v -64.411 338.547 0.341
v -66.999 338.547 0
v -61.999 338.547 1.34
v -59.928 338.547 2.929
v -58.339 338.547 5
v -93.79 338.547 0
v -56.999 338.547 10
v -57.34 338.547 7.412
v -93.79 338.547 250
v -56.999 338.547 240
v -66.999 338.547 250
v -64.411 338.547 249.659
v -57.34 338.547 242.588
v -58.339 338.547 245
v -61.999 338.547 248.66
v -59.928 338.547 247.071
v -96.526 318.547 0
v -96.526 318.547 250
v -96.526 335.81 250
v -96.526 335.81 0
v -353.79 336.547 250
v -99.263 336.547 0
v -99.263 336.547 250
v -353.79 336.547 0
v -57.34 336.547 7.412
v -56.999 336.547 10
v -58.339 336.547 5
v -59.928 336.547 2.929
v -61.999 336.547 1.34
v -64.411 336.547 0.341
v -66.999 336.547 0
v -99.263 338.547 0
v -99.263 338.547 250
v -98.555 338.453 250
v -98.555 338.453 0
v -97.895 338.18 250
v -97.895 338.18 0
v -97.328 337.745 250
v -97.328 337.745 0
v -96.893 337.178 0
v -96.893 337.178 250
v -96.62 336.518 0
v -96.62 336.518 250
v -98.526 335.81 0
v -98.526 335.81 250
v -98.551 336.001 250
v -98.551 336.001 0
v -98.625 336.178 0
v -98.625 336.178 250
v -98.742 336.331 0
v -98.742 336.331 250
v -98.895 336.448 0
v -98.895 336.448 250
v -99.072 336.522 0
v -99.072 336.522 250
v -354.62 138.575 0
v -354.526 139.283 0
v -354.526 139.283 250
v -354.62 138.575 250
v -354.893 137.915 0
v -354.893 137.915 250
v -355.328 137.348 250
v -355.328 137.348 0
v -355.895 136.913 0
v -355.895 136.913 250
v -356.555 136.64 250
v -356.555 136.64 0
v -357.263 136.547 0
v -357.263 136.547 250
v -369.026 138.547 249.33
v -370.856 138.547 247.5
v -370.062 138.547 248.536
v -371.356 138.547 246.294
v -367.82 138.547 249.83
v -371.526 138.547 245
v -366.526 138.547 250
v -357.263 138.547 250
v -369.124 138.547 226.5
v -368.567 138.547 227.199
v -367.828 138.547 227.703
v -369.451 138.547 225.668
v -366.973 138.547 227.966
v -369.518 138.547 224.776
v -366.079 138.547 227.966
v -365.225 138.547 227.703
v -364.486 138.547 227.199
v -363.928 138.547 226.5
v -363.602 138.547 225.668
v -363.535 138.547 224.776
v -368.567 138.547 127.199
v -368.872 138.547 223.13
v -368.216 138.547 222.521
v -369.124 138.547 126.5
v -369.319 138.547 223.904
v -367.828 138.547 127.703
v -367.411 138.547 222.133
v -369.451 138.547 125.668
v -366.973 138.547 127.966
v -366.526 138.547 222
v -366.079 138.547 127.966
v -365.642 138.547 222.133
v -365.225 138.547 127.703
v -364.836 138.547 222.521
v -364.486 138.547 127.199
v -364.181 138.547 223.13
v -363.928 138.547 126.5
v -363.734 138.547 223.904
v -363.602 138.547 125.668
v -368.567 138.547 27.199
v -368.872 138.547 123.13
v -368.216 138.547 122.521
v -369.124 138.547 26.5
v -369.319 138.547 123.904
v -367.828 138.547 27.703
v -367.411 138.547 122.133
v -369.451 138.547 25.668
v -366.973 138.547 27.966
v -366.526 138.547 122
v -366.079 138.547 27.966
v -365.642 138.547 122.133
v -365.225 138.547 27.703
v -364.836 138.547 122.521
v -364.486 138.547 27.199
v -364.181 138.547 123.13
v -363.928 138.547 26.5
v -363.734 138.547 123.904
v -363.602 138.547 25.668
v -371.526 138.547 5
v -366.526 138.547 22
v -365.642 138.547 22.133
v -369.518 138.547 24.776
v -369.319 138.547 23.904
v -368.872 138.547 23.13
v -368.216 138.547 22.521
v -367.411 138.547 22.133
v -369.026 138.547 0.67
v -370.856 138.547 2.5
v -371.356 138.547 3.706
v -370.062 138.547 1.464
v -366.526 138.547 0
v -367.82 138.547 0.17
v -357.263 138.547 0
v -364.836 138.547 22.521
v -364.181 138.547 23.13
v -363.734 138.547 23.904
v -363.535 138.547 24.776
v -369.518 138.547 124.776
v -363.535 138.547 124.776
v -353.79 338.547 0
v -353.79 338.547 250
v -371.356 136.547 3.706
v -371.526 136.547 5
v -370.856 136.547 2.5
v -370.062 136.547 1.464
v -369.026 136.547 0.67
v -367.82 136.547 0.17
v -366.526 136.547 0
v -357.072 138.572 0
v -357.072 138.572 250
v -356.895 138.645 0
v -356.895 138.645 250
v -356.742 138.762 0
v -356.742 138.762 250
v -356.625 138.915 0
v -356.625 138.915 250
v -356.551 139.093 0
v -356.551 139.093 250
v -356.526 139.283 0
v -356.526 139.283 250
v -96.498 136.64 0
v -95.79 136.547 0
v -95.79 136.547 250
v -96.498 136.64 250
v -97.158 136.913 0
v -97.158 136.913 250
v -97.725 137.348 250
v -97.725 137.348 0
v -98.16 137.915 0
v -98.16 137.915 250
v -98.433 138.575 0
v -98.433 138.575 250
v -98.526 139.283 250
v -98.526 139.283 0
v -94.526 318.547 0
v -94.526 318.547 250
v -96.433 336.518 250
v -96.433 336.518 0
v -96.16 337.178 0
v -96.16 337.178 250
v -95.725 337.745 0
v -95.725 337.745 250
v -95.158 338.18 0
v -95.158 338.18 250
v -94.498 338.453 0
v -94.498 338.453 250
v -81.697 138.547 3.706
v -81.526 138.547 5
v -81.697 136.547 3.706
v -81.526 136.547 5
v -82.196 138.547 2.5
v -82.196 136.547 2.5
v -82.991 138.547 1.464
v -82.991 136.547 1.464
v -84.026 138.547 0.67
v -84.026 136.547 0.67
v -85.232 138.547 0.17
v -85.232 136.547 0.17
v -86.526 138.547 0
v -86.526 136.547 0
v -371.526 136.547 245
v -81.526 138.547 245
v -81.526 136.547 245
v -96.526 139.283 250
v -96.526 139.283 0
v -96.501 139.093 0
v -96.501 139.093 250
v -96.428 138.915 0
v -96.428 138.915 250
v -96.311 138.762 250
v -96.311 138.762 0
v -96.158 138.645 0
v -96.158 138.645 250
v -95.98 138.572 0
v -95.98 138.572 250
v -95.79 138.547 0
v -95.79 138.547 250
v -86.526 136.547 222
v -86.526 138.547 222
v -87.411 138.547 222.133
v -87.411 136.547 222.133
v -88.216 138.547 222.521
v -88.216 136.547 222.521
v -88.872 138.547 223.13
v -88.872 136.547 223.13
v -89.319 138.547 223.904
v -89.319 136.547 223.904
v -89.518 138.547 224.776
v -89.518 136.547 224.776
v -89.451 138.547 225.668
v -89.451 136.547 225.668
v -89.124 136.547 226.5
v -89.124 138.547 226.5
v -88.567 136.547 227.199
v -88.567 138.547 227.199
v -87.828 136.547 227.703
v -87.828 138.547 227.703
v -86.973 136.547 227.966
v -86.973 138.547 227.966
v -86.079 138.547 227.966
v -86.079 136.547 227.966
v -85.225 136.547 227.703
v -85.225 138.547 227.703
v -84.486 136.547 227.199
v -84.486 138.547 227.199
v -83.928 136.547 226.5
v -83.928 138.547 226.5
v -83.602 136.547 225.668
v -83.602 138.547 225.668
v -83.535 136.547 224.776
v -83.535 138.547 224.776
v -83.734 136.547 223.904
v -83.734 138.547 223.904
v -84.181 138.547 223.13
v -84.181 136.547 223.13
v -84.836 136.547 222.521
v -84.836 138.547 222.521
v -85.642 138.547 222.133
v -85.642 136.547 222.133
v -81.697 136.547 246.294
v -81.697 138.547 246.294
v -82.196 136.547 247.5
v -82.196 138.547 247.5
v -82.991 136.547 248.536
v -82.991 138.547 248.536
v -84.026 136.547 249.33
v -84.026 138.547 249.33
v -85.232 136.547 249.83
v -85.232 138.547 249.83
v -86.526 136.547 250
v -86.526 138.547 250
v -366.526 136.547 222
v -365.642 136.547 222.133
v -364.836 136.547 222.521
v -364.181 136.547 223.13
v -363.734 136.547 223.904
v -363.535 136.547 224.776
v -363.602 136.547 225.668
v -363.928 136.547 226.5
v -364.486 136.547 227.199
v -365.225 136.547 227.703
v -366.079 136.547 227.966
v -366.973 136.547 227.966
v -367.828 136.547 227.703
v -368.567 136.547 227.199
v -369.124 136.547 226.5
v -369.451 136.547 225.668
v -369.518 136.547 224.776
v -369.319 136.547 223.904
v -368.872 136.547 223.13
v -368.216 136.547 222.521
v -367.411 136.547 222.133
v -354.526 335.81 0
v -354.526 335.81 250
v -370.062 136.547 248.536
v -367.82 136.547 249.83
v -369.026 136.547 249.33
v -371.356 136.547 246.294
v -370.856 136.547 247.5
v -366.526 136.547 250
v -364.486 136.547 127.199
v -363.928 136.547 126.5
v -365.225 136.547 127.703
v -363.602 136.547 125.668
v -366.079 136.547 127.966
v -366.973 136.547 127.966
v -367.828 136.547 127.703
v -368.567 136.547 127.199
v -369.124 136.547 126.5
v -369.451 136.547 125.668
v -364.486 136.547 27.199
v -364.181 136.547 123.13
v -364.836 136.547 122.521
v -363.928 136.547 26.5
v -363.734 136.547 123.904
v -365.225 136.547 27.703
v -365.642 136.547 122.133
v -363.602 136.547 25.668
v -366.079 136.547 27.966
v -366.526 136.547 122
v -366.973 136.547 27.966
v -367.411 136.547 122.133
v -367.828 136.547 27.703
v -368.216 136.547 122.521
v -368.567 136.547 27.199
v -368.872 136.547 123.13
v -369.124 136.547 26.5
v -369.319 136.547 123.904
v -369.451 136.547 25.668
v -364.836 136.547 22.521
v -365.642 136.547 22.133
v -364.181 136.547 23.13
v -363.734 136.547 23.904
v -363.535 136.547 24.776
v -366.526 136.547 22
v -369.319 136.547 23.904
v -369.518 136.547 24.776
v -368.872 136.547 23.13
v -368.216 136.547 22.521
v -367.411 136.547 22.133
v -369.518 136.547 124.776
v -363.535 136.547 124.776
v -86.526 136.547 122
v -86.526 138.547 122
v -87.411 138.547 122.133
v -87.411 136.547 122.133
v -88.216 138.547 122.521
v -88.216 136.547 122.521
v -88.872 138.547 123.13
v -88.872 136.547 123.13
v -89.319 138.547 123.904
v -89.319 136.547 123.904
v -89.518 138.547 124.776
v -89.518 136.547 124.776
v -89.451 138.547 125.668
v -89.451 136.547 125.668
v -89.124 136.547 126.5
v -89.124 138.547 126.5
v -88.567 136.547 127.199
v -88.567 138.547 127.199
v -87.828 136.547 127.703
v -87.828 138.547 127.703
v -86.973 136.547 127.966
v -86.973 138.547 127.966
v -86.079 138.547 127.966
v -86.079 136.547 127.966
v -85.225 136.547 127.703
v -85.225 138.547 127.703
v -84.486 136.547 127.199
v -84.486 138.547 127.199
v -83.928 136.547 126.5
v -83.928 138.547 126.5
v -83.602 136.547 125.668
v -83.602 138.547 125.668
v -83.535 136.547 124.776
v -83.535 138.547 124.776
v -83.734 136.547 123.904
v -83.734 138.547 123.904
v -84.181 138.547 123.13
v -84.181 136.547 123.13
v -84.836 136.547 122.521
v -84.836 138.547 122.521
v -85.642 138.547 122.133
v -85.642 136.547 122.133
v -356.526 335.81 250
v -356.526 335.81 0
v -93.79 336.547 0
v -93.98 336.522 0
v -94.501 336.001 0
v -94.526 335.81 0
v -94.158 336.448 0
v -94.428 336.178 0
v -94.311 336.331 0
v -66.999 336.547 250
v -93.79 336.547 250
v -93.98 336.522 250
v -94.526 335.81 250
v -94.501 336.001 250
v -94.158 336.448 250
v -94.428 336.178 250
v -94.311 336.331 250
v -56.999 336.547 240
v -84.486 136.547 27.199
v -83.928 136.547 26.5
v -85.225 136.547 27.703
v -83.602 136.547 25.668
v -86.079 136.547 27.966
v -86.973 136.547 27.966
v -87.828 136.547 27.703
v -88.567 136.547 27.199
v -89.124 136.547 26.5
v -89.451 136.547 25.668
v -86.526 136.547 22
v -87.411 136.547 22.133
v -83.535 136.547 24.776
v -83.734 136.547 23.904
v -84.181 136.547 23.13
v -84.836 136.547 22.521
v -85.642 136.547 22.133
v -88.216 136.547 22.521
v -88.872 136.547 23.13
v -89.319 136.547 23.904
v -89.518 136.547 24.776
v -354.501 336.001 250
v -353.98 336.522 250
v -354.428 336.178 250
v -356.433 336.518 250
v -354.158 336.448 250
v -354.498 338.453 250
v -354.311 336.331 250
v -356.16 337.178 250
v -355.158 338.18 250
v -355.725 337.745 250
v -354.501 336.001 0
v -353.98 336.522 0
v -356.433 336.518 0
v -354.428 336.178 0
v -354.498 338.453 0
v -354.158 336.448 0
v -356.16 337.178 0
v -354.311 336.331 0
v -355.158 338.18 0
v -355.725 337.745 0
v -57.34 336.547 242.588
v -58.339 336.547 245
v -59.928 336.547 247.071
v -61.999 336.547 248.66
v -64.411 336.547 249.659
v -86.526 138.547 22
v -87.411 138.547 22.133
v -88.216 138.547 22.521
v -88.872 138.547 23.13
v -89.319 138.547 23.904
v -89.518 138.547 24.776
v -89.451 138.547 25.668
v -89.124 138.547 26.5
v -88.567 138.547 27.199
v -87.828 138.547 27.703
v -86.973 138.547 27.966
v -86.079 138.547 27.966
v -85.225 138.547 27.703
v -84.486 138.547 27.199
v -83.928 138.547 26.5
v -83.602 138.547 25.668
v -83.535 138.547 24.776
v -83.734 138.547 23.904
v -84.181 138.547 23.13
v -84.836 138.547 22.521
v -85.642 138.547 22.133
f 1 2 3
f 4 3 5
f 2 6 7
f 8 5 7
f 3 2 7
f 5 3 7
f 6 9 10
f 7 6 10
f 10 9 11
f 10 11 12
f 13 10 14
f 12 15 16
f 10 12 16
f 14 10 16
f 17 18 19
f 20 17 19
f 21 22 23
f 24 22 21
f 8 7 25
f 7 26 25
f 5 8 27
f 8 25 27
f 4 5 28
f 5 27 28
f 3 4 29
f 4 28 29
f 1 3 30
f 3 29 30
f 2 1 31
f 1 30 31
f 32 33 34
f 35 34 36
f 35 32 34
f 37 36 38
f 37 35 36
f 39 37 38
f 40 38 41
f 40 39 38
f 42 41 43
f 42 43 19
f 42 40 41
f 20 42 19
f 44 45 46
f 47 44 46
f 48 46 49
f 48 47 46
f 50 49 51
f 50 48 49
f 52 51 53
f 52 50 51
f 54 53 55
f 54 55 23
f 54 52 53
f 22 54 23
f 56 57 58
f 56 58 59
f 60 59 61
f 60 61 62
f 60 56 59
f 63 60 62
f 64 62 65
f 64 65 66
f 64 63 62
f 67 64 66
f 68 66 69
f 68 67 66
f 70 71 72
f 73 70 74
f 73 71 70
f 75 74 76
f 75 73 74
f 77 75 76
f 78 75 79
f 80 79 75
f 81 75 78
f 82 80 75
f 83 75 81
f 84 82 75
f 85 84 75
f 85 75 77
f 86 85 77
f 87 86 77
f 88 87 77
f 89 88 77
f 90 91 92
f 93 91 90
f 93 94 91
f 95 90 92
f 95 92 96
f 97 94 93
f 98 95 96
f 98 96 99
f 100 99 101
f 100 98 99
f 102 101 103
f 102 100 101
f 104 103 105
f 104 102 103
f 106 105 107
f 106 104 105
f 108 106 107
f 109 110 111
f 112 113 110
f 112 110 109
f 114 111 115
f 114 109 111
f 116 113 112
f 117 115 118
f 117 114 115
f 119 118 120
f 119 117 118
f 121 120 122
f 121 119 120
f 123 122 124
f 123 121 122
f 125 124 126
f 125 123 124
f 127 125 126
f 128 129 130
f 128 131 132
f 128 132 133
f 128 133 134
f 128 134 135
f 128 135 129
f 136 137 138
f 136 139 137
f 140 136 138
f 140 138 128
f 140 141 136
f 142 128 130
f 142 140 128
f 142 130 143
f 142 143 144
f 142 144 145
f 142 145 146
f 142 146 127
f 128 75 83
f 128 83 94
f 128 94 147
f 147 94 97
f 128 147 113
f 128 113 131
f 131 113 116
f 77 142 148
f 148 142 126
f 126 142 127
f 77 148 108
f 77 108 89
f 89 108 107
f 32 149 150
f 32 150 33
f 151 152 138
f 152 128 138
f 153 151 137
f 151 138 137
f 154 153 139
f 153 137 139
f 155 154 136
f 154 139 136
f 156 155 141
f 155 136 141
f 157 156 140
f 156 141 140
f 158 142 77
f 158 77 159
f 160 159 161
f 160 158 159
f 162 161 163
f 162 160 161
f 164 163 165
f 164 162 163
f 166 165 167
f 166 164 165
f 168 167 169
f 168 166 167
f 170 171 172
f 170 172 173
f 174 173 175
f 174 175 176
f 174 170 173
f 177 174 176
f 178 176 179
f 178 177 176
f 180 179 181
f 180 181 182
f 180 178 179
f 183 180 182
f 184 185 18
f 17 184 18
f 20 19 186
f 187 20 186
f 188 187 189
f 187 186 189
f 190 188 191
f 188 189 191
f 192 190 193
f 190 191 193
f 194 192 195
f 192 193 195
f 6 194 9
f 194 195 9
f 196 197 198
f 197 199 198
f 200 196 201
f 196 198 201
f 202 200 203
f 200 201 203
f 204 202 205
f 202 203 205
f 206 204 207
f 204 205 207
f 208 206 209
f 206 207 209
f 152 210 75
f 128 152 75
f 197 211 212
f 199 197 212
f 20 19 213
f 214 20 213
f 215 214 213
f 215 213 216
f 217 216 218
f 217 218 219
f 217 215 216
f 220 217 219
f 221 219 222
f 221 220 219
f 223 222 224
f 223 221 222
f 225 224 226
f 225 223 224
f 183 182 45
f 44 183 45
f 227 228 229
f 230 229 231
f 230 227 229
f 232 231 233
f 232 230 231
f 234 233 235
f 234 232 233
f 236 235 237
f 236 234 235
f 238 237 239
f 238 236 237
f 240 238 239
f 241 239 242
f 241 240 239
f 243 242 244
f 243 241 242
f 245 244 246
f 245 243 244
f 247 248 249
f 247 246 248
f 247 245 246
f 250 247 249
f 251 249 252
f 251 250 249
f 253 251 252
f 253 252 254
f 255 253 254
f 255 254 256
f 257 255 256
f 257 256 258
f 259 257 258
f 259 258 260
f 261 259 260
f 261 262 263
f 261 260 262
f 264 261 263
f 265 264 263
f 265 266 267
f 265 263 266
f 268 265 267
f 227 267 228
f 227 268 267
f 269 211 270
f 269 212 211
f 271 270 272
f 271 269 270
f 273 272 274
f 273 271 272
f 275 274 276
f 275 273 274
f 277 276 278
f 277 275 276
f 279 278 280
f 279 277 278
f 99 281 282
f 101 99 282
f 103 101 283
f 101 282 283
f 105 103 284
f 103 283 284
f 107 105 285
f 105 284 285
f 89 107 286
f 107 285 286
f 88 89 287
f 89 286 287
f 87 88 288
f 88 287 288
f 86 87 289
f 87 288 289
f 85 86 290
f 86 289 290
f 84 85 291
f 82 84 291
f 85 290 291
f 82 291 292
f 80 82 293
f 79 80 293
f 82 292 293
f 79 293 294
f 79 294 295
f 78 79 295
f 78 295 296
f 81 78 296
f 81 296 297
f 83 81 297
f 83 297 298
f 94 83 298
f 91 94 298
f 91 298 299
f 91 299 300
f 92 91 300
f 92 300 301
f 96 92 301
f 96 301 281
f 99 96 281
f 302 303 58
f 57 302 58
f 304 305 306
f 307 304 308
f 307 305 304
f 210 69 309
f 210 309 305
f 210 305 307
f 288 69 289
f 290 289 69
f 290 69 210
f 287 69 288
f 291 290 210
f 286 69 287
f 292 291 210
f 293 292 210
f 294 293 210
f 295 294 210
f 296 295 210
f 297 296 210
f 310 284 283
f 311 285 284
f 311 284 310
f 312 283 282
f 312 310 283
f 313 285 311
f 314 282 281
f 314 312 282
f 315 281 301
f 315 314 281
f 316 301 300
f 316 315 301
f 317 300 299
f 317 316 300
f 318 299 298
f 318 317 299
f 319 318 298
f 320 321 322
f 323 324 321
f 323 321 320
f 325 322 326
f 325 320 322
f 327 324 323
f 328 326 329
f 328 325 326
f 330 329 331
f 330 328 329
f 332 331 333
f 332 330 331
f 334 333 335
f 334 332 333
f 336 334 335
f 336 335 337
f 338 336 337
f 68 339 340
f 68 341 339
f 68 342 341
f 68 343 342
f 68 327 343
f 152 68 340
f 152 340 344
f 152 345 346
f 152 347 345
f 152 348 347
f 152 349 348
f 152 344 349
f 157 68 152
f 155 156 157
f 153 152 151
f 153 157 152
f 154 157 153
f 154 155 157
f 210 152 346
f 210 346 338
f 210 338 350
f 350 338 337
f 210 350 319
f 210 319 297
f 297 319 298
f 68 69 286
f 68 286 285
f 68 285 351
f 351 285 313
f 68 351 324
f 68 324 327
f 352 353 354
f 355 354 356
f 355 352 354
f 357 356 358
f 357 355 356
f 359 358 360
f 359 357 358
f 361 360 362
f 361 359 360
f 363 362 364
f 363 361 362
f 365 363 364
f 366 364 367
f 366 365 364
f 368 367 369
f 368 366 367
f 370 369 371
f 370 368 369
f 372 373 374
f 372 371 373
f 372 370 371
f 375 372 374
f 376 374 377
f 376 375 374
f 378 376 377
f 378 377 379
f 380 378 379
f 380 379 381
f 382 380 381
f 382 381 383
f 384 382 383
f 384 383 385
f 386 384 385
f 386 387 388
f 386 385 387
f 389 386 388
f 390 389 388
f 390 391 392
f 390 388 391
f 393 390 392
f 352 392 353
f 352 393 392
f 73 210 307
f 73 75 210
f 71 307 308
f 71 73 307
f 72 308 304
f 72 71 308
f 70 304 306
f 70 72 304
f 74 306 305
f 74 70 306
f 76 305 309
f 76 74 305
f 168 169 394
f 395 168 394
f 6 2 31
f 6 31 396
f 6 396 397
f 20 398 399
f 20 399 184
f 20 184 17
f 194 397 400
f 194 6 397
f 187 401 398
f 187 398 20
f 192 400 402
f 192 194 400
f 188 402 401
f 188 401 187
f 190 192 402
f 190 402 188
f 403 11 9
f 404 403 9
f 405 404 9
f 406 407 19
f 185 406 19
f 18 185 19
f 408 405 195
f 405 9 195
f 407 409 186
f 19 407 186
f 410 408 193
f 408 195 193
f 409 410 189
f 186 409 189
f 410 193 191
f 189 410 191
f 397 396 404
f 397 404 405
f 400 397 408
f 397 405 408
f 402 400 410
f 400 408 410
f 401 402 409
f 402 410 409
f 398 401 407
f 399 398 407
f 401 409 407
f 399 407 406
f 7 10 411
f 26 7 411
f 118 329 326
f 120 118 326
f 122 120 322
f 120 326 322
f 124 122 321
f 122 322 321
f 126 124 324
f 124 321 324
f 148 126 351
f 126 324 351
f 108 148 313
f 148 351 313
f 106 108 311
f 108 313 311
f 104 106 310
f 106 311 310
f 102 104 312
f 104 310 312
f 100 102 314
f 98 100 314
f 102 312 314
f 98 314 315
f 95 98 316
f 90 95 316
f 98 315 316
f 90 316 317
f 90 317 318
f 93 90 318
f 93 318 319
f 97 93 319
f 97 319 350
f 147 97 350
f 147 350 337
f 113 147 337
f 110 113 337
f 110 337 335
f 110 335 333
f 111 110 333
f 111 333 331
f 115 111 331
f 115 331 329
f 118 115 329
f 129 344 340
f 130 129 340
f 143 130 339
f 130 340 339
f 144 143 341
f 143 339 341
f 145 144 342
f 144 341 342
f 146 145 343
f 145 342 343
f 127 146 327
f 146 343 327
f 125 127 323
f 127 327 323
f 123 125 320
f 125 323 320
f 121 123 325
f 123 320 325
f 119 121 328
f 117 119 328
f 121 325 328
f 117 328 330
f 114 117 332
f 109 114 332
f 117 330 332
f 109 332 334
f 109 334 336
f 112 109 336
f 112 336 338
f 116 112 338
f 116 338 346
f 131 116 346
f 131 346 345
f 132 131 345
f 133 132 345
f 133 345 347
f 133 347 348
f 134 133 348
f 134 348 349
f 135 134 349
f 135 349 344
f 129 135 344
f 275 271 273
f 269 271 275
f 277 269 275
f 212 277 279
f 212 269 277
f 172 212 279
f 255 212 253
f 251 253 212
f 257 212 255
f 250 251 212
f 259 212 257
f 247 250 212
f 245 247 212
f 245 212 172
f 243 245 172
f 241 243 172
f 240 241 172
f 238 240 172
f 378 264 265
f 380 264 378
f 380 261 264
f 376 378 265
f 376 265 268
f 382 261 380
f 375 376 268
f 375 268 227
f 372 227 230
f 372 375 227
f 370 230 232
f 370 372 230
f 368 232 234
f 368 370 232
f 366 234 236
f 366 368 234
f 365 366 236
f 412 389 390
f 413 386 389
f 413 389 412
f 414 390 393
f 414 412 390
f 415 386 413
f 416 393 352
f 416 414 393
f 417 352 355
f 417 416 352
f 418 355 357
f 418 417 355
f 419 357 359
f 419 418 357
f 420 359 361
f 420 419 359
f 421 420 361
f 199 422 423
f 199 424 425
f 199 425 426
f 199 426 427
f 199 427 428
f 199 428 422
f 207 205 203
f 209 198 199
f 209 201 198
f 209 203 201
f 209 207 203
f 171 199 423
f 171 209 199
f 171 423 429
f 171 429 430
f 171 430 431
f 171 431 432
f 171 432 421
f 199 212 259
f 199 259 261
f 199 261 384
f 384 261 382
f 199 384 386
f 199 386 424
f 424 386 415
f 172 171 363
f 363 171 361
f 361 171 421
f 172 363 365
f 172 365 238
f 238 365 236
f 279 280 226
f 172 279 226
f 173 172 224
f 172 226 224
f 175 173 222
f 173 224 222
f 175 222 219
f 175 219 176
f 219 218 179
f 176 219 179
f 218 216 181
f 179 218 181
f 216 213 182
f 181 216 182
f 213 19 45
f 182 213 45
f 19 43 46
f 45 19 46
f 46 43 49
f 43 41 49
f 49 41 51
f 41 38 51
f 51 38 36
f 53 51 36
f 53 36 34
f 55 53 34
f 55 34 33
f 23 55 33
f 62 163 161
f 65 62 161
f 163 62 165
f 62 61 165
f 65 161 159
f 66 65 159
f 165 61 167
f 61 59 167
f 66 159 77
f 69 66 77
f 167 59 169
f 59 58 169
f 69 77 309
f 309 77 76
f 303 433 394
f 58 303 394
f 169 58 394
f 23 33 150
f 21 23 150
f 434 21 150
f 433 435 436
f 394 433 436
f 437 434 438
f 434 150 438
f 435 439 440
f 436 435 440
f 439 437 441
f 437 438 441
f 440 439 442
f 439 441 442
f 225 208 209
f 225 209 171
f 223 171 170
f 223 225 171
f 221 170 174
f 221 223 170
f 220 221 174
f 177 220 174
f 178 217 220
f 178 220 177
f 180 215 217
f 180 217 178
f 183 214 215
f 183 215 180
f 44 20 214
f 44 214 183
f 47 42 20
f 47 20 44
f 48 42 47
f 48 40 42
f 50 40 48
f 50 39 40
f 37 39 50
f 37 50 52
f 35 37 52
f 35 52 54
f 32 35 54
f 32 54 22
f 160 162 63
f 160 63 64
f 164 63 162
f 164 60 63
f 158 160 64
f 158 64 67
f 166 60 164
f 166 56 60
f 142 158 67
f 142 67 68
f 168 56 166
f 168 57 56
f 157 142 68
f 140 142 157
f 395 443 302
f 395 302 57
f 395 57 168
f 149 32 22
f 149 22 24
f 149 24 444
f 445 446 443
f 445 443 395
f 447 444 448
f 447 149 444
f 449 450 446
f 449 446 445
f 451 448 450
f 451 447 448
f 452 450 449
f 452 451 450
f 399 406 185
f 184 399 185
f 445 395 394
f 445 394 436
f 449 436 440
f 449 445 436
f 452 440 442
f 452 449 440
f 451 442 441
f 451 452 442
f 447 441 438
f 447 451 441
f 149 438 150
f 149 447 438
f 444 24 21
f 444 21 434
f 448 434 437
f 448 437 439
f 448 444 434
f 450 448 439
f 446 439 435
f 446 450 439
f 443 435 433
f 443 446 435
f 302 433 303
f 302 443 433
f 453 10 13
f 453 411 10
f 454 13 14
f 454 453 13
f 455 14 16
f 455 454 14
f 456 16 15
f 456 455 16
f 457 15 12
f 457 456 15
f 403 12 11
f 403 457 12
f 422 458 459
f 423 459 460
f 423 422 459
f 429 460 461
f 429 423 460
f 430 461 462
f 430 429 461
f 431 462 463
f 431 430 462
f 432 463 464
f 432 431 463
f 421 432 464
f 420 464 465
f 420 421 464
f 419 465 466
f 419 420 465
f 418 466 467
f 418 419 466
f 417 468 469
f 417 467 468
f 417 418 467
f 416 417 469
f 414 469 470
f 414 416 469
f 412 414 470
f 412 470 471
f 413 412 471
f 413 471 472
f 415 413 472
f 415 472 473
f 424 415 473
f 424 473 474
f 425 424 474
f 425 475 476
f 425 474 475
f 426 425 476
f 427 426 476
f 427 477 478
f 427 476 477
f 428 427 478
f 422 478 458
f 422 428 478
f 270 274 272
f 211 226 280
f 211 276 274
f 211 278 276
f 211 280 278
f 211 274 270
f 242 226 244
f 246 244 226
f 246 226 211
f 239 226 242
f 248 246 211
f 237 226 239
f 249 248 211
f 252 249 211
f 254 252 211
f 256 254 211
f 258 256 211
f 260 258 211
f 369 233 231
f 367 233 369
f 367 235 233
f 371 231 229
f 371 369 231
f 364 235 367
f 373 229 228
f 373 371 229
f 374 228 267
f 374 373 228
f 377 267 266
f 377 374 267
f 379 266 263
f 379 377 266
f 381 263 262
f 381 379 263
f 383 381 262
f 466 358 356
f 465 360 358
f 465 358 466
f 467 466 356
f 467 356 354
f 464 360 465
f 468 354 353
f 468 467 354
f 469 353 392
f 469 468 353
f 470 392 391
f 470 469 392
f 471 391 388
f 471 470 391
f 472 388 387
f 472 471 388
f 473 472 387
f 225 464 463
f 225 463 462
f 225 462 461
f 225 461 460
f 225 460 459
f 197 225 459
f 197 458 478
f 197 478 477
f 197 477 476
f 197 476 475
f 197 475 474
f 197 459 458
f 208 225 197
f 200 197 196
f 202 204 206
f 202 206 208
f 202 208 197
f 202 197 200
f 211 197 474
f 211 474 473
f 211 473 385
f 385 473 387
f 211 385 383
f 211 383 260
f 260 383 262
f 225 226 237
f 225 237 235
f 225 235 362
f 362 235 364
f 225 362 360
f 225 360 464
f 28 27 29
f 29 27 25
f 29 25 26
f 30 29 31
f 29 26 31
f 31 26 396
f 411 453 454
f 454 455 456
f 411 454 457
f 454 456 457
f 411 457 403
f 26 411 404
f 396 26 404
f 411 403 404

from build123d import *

# Parameters (mm, degrees)
SM_BASE_FLANGE_1_DEPTH = 250
SM_BASE_FLANGE_2_DEPTH = 250
FILLET_1_R             = 10
FILLET_2_R             = 5
SKETCH_9_R             = 3
CUT_EXTRUDE_1_DEPTH    = 10


# Sheet-metal steps are written as plain solids
with BuildPart() as part:
    # Sketch 1 → 基体-法兰1 (new body)
    with BuildSketch(Plane.XY):
        with BuildLine():
            Line((-371.526300738, 138.546722129), (-357.262900738, 138.546722129))
            ThreePointArc((-357.262900738, 138.546722129), (-356.742045883, 138.762467274), (-356.526300738, 139.283322129))
            Line((-356.526300738, 139.283322129), (-356.526300738, 335.810122129))
            ThreePointArc((-356.526300738, 335.810122129), (-355.724769156, 337.745190547), (-353.789700738, 338.546722129))
            Line((-353.789700738, 338.546722129), (-99.262900738, 338.546722129))
            ThreePointArc((-99.262900738, 338.546722129), (-97.327832321, 337.745190547), (-96.526300738, 335.810122129))
            Line((-96.526300738, 335.810122129), (-96.526300738, 139.283322129))
            ThreePointArc((-96.526300738, 139.283322129), (-96.310555593, 138.762467274), (-95.789700738, 138.546722129))
            Line((-95.789700738, 138.546722129), (-81.526300738, 138.546722129))
            Line((-81.526300738, 138.546722129), (-81.526300738, 136.546722129))
            Line((-81.526300738, 136.546722129), (-95.789700738, 136.546722129))
            ThreePointArc((-95.789700738, 136.546722129), (-97.724769156, 137.348253712), (-98.526300738, 139.283322129))
            Line((-98.526300738, 139.283322129), (-98.526300738, 335.810122129))
            ThreePointArc((-98.526300738, 335.810122129), (-98.742045883, 336.330976984), (-99.262900738, 336.546722129))
            Line((-99.262900738, 336.546722129), (-353.789700738, 336.546722129))
            ThreePointArc((-353.789700738, 336.546722129), (-354.310555593, 336.330976984), (-354.526300738, 335.810122129))
            Line((-354.526300738, 335.810122129), (-354.526300738, 139.283322129))
            ThreePointArc((-354.526300738, 139.283322129), (-355.327832321, 137.348253712), (-357.262900738, 136.546722129))
            Line((-357.262900738, 136.546722129), (-371.526300738, 136.546722129))
            Line((-371.526300738, 136.546722129), (-371.526300738, 138.546722129))
        make_face()
    extrude(amount=SM_BASE_FLANGE_1_DEPTH)

    # 圆角2
    fillet_2_edges = [part.edges().sort_by_distance(p)[0] for p in [
        (-371.526300738, 137.546722129, 0),
        (-81.526300738, 137.546722129, 0),
        (-371.526300738, 137.546722129, 250),
        (-81.526300738, 137.546722129, 250),
    ]]
    fillet(fillet_2_edges, radius=FILLET_2_R)

    # 草图9 → 切除-拉伸1 (cut)
    with BuildSketch(Plane.XZ.offset(-136.546722129)):
        with Locations(Location((-366.526300738, 225, 0), (0, 0, 270))):
            Circle(SKETCH_9_R)
        with Locations(Location((-366.526300738, 125, 0), (0, 0, 270))):
            Circle(SKETCH_9_R)
        with Locations(Location((-366.526300738, 25, 0), (0, 0, 270))):
            Circle(SKETCH_9_R)
    cut_extrude_1 = extrude(amount=-CUT_EXTRUDE_1_DEPTH, mode=Mode.SUBTRACT)

    # 镜向1: 切除-拉伸1 across plane
    add(cut_extrude_1.mirror(Plane(origin=(-226.526300738, 0, 0), x_dir=(0, 0, 1), z_dir=(1, 0, 0))), mode=Mode.SUBTRACT)


with BuildPart() as body_2:
    # 草图6 → 基体-法兰2 (new body)
    with BuildSketch(Plane.XY.offset(250)):
        with BuildLine():
            Line((-96.526300738, 318.546722129), (-96.526300738, 335.810122129))
            ThreePointArc((-96.526300738, 335.810122129), (-95.724769156, 337.745190547), (-93.789700738, 338.546722129))
            Line((-93.789700738, 338.546722129), (-56.999497946, 338.546722129))
            Line((-56.999497946, 338.546722129), (-56.999497946, 336.546722129))
            Line((-56.999497946, 336.546722129), (-93.789700738, 336.546722129))
            ThreePointArc((-93.789700738, 336.546722129), (-94.310555593, 336.330976984), (-94.526300738, 335.810122129))
            Line((-94.526300738, 335.810122129), (-94.526300738, 318.546722129))
            Line((-94.526300738, 318.546722129), (-96.526300738, 318.546722129))
        make_face()
    extrude(amount=-SM_BASE_FLANGE_2_DEPTH)

    # 圆角1
    fillet_1_edges = [body_2.edges().sort_by_distance(p)[0] for p in [
        (-56.999497946, 337.546722129, 0),
        (-56.999497946, 337.546722129, 250),
    ]]
    fillet(fillet_1_edges, radius=FILLET_1_R)


solid = Compound([part.part, body_2.part])
